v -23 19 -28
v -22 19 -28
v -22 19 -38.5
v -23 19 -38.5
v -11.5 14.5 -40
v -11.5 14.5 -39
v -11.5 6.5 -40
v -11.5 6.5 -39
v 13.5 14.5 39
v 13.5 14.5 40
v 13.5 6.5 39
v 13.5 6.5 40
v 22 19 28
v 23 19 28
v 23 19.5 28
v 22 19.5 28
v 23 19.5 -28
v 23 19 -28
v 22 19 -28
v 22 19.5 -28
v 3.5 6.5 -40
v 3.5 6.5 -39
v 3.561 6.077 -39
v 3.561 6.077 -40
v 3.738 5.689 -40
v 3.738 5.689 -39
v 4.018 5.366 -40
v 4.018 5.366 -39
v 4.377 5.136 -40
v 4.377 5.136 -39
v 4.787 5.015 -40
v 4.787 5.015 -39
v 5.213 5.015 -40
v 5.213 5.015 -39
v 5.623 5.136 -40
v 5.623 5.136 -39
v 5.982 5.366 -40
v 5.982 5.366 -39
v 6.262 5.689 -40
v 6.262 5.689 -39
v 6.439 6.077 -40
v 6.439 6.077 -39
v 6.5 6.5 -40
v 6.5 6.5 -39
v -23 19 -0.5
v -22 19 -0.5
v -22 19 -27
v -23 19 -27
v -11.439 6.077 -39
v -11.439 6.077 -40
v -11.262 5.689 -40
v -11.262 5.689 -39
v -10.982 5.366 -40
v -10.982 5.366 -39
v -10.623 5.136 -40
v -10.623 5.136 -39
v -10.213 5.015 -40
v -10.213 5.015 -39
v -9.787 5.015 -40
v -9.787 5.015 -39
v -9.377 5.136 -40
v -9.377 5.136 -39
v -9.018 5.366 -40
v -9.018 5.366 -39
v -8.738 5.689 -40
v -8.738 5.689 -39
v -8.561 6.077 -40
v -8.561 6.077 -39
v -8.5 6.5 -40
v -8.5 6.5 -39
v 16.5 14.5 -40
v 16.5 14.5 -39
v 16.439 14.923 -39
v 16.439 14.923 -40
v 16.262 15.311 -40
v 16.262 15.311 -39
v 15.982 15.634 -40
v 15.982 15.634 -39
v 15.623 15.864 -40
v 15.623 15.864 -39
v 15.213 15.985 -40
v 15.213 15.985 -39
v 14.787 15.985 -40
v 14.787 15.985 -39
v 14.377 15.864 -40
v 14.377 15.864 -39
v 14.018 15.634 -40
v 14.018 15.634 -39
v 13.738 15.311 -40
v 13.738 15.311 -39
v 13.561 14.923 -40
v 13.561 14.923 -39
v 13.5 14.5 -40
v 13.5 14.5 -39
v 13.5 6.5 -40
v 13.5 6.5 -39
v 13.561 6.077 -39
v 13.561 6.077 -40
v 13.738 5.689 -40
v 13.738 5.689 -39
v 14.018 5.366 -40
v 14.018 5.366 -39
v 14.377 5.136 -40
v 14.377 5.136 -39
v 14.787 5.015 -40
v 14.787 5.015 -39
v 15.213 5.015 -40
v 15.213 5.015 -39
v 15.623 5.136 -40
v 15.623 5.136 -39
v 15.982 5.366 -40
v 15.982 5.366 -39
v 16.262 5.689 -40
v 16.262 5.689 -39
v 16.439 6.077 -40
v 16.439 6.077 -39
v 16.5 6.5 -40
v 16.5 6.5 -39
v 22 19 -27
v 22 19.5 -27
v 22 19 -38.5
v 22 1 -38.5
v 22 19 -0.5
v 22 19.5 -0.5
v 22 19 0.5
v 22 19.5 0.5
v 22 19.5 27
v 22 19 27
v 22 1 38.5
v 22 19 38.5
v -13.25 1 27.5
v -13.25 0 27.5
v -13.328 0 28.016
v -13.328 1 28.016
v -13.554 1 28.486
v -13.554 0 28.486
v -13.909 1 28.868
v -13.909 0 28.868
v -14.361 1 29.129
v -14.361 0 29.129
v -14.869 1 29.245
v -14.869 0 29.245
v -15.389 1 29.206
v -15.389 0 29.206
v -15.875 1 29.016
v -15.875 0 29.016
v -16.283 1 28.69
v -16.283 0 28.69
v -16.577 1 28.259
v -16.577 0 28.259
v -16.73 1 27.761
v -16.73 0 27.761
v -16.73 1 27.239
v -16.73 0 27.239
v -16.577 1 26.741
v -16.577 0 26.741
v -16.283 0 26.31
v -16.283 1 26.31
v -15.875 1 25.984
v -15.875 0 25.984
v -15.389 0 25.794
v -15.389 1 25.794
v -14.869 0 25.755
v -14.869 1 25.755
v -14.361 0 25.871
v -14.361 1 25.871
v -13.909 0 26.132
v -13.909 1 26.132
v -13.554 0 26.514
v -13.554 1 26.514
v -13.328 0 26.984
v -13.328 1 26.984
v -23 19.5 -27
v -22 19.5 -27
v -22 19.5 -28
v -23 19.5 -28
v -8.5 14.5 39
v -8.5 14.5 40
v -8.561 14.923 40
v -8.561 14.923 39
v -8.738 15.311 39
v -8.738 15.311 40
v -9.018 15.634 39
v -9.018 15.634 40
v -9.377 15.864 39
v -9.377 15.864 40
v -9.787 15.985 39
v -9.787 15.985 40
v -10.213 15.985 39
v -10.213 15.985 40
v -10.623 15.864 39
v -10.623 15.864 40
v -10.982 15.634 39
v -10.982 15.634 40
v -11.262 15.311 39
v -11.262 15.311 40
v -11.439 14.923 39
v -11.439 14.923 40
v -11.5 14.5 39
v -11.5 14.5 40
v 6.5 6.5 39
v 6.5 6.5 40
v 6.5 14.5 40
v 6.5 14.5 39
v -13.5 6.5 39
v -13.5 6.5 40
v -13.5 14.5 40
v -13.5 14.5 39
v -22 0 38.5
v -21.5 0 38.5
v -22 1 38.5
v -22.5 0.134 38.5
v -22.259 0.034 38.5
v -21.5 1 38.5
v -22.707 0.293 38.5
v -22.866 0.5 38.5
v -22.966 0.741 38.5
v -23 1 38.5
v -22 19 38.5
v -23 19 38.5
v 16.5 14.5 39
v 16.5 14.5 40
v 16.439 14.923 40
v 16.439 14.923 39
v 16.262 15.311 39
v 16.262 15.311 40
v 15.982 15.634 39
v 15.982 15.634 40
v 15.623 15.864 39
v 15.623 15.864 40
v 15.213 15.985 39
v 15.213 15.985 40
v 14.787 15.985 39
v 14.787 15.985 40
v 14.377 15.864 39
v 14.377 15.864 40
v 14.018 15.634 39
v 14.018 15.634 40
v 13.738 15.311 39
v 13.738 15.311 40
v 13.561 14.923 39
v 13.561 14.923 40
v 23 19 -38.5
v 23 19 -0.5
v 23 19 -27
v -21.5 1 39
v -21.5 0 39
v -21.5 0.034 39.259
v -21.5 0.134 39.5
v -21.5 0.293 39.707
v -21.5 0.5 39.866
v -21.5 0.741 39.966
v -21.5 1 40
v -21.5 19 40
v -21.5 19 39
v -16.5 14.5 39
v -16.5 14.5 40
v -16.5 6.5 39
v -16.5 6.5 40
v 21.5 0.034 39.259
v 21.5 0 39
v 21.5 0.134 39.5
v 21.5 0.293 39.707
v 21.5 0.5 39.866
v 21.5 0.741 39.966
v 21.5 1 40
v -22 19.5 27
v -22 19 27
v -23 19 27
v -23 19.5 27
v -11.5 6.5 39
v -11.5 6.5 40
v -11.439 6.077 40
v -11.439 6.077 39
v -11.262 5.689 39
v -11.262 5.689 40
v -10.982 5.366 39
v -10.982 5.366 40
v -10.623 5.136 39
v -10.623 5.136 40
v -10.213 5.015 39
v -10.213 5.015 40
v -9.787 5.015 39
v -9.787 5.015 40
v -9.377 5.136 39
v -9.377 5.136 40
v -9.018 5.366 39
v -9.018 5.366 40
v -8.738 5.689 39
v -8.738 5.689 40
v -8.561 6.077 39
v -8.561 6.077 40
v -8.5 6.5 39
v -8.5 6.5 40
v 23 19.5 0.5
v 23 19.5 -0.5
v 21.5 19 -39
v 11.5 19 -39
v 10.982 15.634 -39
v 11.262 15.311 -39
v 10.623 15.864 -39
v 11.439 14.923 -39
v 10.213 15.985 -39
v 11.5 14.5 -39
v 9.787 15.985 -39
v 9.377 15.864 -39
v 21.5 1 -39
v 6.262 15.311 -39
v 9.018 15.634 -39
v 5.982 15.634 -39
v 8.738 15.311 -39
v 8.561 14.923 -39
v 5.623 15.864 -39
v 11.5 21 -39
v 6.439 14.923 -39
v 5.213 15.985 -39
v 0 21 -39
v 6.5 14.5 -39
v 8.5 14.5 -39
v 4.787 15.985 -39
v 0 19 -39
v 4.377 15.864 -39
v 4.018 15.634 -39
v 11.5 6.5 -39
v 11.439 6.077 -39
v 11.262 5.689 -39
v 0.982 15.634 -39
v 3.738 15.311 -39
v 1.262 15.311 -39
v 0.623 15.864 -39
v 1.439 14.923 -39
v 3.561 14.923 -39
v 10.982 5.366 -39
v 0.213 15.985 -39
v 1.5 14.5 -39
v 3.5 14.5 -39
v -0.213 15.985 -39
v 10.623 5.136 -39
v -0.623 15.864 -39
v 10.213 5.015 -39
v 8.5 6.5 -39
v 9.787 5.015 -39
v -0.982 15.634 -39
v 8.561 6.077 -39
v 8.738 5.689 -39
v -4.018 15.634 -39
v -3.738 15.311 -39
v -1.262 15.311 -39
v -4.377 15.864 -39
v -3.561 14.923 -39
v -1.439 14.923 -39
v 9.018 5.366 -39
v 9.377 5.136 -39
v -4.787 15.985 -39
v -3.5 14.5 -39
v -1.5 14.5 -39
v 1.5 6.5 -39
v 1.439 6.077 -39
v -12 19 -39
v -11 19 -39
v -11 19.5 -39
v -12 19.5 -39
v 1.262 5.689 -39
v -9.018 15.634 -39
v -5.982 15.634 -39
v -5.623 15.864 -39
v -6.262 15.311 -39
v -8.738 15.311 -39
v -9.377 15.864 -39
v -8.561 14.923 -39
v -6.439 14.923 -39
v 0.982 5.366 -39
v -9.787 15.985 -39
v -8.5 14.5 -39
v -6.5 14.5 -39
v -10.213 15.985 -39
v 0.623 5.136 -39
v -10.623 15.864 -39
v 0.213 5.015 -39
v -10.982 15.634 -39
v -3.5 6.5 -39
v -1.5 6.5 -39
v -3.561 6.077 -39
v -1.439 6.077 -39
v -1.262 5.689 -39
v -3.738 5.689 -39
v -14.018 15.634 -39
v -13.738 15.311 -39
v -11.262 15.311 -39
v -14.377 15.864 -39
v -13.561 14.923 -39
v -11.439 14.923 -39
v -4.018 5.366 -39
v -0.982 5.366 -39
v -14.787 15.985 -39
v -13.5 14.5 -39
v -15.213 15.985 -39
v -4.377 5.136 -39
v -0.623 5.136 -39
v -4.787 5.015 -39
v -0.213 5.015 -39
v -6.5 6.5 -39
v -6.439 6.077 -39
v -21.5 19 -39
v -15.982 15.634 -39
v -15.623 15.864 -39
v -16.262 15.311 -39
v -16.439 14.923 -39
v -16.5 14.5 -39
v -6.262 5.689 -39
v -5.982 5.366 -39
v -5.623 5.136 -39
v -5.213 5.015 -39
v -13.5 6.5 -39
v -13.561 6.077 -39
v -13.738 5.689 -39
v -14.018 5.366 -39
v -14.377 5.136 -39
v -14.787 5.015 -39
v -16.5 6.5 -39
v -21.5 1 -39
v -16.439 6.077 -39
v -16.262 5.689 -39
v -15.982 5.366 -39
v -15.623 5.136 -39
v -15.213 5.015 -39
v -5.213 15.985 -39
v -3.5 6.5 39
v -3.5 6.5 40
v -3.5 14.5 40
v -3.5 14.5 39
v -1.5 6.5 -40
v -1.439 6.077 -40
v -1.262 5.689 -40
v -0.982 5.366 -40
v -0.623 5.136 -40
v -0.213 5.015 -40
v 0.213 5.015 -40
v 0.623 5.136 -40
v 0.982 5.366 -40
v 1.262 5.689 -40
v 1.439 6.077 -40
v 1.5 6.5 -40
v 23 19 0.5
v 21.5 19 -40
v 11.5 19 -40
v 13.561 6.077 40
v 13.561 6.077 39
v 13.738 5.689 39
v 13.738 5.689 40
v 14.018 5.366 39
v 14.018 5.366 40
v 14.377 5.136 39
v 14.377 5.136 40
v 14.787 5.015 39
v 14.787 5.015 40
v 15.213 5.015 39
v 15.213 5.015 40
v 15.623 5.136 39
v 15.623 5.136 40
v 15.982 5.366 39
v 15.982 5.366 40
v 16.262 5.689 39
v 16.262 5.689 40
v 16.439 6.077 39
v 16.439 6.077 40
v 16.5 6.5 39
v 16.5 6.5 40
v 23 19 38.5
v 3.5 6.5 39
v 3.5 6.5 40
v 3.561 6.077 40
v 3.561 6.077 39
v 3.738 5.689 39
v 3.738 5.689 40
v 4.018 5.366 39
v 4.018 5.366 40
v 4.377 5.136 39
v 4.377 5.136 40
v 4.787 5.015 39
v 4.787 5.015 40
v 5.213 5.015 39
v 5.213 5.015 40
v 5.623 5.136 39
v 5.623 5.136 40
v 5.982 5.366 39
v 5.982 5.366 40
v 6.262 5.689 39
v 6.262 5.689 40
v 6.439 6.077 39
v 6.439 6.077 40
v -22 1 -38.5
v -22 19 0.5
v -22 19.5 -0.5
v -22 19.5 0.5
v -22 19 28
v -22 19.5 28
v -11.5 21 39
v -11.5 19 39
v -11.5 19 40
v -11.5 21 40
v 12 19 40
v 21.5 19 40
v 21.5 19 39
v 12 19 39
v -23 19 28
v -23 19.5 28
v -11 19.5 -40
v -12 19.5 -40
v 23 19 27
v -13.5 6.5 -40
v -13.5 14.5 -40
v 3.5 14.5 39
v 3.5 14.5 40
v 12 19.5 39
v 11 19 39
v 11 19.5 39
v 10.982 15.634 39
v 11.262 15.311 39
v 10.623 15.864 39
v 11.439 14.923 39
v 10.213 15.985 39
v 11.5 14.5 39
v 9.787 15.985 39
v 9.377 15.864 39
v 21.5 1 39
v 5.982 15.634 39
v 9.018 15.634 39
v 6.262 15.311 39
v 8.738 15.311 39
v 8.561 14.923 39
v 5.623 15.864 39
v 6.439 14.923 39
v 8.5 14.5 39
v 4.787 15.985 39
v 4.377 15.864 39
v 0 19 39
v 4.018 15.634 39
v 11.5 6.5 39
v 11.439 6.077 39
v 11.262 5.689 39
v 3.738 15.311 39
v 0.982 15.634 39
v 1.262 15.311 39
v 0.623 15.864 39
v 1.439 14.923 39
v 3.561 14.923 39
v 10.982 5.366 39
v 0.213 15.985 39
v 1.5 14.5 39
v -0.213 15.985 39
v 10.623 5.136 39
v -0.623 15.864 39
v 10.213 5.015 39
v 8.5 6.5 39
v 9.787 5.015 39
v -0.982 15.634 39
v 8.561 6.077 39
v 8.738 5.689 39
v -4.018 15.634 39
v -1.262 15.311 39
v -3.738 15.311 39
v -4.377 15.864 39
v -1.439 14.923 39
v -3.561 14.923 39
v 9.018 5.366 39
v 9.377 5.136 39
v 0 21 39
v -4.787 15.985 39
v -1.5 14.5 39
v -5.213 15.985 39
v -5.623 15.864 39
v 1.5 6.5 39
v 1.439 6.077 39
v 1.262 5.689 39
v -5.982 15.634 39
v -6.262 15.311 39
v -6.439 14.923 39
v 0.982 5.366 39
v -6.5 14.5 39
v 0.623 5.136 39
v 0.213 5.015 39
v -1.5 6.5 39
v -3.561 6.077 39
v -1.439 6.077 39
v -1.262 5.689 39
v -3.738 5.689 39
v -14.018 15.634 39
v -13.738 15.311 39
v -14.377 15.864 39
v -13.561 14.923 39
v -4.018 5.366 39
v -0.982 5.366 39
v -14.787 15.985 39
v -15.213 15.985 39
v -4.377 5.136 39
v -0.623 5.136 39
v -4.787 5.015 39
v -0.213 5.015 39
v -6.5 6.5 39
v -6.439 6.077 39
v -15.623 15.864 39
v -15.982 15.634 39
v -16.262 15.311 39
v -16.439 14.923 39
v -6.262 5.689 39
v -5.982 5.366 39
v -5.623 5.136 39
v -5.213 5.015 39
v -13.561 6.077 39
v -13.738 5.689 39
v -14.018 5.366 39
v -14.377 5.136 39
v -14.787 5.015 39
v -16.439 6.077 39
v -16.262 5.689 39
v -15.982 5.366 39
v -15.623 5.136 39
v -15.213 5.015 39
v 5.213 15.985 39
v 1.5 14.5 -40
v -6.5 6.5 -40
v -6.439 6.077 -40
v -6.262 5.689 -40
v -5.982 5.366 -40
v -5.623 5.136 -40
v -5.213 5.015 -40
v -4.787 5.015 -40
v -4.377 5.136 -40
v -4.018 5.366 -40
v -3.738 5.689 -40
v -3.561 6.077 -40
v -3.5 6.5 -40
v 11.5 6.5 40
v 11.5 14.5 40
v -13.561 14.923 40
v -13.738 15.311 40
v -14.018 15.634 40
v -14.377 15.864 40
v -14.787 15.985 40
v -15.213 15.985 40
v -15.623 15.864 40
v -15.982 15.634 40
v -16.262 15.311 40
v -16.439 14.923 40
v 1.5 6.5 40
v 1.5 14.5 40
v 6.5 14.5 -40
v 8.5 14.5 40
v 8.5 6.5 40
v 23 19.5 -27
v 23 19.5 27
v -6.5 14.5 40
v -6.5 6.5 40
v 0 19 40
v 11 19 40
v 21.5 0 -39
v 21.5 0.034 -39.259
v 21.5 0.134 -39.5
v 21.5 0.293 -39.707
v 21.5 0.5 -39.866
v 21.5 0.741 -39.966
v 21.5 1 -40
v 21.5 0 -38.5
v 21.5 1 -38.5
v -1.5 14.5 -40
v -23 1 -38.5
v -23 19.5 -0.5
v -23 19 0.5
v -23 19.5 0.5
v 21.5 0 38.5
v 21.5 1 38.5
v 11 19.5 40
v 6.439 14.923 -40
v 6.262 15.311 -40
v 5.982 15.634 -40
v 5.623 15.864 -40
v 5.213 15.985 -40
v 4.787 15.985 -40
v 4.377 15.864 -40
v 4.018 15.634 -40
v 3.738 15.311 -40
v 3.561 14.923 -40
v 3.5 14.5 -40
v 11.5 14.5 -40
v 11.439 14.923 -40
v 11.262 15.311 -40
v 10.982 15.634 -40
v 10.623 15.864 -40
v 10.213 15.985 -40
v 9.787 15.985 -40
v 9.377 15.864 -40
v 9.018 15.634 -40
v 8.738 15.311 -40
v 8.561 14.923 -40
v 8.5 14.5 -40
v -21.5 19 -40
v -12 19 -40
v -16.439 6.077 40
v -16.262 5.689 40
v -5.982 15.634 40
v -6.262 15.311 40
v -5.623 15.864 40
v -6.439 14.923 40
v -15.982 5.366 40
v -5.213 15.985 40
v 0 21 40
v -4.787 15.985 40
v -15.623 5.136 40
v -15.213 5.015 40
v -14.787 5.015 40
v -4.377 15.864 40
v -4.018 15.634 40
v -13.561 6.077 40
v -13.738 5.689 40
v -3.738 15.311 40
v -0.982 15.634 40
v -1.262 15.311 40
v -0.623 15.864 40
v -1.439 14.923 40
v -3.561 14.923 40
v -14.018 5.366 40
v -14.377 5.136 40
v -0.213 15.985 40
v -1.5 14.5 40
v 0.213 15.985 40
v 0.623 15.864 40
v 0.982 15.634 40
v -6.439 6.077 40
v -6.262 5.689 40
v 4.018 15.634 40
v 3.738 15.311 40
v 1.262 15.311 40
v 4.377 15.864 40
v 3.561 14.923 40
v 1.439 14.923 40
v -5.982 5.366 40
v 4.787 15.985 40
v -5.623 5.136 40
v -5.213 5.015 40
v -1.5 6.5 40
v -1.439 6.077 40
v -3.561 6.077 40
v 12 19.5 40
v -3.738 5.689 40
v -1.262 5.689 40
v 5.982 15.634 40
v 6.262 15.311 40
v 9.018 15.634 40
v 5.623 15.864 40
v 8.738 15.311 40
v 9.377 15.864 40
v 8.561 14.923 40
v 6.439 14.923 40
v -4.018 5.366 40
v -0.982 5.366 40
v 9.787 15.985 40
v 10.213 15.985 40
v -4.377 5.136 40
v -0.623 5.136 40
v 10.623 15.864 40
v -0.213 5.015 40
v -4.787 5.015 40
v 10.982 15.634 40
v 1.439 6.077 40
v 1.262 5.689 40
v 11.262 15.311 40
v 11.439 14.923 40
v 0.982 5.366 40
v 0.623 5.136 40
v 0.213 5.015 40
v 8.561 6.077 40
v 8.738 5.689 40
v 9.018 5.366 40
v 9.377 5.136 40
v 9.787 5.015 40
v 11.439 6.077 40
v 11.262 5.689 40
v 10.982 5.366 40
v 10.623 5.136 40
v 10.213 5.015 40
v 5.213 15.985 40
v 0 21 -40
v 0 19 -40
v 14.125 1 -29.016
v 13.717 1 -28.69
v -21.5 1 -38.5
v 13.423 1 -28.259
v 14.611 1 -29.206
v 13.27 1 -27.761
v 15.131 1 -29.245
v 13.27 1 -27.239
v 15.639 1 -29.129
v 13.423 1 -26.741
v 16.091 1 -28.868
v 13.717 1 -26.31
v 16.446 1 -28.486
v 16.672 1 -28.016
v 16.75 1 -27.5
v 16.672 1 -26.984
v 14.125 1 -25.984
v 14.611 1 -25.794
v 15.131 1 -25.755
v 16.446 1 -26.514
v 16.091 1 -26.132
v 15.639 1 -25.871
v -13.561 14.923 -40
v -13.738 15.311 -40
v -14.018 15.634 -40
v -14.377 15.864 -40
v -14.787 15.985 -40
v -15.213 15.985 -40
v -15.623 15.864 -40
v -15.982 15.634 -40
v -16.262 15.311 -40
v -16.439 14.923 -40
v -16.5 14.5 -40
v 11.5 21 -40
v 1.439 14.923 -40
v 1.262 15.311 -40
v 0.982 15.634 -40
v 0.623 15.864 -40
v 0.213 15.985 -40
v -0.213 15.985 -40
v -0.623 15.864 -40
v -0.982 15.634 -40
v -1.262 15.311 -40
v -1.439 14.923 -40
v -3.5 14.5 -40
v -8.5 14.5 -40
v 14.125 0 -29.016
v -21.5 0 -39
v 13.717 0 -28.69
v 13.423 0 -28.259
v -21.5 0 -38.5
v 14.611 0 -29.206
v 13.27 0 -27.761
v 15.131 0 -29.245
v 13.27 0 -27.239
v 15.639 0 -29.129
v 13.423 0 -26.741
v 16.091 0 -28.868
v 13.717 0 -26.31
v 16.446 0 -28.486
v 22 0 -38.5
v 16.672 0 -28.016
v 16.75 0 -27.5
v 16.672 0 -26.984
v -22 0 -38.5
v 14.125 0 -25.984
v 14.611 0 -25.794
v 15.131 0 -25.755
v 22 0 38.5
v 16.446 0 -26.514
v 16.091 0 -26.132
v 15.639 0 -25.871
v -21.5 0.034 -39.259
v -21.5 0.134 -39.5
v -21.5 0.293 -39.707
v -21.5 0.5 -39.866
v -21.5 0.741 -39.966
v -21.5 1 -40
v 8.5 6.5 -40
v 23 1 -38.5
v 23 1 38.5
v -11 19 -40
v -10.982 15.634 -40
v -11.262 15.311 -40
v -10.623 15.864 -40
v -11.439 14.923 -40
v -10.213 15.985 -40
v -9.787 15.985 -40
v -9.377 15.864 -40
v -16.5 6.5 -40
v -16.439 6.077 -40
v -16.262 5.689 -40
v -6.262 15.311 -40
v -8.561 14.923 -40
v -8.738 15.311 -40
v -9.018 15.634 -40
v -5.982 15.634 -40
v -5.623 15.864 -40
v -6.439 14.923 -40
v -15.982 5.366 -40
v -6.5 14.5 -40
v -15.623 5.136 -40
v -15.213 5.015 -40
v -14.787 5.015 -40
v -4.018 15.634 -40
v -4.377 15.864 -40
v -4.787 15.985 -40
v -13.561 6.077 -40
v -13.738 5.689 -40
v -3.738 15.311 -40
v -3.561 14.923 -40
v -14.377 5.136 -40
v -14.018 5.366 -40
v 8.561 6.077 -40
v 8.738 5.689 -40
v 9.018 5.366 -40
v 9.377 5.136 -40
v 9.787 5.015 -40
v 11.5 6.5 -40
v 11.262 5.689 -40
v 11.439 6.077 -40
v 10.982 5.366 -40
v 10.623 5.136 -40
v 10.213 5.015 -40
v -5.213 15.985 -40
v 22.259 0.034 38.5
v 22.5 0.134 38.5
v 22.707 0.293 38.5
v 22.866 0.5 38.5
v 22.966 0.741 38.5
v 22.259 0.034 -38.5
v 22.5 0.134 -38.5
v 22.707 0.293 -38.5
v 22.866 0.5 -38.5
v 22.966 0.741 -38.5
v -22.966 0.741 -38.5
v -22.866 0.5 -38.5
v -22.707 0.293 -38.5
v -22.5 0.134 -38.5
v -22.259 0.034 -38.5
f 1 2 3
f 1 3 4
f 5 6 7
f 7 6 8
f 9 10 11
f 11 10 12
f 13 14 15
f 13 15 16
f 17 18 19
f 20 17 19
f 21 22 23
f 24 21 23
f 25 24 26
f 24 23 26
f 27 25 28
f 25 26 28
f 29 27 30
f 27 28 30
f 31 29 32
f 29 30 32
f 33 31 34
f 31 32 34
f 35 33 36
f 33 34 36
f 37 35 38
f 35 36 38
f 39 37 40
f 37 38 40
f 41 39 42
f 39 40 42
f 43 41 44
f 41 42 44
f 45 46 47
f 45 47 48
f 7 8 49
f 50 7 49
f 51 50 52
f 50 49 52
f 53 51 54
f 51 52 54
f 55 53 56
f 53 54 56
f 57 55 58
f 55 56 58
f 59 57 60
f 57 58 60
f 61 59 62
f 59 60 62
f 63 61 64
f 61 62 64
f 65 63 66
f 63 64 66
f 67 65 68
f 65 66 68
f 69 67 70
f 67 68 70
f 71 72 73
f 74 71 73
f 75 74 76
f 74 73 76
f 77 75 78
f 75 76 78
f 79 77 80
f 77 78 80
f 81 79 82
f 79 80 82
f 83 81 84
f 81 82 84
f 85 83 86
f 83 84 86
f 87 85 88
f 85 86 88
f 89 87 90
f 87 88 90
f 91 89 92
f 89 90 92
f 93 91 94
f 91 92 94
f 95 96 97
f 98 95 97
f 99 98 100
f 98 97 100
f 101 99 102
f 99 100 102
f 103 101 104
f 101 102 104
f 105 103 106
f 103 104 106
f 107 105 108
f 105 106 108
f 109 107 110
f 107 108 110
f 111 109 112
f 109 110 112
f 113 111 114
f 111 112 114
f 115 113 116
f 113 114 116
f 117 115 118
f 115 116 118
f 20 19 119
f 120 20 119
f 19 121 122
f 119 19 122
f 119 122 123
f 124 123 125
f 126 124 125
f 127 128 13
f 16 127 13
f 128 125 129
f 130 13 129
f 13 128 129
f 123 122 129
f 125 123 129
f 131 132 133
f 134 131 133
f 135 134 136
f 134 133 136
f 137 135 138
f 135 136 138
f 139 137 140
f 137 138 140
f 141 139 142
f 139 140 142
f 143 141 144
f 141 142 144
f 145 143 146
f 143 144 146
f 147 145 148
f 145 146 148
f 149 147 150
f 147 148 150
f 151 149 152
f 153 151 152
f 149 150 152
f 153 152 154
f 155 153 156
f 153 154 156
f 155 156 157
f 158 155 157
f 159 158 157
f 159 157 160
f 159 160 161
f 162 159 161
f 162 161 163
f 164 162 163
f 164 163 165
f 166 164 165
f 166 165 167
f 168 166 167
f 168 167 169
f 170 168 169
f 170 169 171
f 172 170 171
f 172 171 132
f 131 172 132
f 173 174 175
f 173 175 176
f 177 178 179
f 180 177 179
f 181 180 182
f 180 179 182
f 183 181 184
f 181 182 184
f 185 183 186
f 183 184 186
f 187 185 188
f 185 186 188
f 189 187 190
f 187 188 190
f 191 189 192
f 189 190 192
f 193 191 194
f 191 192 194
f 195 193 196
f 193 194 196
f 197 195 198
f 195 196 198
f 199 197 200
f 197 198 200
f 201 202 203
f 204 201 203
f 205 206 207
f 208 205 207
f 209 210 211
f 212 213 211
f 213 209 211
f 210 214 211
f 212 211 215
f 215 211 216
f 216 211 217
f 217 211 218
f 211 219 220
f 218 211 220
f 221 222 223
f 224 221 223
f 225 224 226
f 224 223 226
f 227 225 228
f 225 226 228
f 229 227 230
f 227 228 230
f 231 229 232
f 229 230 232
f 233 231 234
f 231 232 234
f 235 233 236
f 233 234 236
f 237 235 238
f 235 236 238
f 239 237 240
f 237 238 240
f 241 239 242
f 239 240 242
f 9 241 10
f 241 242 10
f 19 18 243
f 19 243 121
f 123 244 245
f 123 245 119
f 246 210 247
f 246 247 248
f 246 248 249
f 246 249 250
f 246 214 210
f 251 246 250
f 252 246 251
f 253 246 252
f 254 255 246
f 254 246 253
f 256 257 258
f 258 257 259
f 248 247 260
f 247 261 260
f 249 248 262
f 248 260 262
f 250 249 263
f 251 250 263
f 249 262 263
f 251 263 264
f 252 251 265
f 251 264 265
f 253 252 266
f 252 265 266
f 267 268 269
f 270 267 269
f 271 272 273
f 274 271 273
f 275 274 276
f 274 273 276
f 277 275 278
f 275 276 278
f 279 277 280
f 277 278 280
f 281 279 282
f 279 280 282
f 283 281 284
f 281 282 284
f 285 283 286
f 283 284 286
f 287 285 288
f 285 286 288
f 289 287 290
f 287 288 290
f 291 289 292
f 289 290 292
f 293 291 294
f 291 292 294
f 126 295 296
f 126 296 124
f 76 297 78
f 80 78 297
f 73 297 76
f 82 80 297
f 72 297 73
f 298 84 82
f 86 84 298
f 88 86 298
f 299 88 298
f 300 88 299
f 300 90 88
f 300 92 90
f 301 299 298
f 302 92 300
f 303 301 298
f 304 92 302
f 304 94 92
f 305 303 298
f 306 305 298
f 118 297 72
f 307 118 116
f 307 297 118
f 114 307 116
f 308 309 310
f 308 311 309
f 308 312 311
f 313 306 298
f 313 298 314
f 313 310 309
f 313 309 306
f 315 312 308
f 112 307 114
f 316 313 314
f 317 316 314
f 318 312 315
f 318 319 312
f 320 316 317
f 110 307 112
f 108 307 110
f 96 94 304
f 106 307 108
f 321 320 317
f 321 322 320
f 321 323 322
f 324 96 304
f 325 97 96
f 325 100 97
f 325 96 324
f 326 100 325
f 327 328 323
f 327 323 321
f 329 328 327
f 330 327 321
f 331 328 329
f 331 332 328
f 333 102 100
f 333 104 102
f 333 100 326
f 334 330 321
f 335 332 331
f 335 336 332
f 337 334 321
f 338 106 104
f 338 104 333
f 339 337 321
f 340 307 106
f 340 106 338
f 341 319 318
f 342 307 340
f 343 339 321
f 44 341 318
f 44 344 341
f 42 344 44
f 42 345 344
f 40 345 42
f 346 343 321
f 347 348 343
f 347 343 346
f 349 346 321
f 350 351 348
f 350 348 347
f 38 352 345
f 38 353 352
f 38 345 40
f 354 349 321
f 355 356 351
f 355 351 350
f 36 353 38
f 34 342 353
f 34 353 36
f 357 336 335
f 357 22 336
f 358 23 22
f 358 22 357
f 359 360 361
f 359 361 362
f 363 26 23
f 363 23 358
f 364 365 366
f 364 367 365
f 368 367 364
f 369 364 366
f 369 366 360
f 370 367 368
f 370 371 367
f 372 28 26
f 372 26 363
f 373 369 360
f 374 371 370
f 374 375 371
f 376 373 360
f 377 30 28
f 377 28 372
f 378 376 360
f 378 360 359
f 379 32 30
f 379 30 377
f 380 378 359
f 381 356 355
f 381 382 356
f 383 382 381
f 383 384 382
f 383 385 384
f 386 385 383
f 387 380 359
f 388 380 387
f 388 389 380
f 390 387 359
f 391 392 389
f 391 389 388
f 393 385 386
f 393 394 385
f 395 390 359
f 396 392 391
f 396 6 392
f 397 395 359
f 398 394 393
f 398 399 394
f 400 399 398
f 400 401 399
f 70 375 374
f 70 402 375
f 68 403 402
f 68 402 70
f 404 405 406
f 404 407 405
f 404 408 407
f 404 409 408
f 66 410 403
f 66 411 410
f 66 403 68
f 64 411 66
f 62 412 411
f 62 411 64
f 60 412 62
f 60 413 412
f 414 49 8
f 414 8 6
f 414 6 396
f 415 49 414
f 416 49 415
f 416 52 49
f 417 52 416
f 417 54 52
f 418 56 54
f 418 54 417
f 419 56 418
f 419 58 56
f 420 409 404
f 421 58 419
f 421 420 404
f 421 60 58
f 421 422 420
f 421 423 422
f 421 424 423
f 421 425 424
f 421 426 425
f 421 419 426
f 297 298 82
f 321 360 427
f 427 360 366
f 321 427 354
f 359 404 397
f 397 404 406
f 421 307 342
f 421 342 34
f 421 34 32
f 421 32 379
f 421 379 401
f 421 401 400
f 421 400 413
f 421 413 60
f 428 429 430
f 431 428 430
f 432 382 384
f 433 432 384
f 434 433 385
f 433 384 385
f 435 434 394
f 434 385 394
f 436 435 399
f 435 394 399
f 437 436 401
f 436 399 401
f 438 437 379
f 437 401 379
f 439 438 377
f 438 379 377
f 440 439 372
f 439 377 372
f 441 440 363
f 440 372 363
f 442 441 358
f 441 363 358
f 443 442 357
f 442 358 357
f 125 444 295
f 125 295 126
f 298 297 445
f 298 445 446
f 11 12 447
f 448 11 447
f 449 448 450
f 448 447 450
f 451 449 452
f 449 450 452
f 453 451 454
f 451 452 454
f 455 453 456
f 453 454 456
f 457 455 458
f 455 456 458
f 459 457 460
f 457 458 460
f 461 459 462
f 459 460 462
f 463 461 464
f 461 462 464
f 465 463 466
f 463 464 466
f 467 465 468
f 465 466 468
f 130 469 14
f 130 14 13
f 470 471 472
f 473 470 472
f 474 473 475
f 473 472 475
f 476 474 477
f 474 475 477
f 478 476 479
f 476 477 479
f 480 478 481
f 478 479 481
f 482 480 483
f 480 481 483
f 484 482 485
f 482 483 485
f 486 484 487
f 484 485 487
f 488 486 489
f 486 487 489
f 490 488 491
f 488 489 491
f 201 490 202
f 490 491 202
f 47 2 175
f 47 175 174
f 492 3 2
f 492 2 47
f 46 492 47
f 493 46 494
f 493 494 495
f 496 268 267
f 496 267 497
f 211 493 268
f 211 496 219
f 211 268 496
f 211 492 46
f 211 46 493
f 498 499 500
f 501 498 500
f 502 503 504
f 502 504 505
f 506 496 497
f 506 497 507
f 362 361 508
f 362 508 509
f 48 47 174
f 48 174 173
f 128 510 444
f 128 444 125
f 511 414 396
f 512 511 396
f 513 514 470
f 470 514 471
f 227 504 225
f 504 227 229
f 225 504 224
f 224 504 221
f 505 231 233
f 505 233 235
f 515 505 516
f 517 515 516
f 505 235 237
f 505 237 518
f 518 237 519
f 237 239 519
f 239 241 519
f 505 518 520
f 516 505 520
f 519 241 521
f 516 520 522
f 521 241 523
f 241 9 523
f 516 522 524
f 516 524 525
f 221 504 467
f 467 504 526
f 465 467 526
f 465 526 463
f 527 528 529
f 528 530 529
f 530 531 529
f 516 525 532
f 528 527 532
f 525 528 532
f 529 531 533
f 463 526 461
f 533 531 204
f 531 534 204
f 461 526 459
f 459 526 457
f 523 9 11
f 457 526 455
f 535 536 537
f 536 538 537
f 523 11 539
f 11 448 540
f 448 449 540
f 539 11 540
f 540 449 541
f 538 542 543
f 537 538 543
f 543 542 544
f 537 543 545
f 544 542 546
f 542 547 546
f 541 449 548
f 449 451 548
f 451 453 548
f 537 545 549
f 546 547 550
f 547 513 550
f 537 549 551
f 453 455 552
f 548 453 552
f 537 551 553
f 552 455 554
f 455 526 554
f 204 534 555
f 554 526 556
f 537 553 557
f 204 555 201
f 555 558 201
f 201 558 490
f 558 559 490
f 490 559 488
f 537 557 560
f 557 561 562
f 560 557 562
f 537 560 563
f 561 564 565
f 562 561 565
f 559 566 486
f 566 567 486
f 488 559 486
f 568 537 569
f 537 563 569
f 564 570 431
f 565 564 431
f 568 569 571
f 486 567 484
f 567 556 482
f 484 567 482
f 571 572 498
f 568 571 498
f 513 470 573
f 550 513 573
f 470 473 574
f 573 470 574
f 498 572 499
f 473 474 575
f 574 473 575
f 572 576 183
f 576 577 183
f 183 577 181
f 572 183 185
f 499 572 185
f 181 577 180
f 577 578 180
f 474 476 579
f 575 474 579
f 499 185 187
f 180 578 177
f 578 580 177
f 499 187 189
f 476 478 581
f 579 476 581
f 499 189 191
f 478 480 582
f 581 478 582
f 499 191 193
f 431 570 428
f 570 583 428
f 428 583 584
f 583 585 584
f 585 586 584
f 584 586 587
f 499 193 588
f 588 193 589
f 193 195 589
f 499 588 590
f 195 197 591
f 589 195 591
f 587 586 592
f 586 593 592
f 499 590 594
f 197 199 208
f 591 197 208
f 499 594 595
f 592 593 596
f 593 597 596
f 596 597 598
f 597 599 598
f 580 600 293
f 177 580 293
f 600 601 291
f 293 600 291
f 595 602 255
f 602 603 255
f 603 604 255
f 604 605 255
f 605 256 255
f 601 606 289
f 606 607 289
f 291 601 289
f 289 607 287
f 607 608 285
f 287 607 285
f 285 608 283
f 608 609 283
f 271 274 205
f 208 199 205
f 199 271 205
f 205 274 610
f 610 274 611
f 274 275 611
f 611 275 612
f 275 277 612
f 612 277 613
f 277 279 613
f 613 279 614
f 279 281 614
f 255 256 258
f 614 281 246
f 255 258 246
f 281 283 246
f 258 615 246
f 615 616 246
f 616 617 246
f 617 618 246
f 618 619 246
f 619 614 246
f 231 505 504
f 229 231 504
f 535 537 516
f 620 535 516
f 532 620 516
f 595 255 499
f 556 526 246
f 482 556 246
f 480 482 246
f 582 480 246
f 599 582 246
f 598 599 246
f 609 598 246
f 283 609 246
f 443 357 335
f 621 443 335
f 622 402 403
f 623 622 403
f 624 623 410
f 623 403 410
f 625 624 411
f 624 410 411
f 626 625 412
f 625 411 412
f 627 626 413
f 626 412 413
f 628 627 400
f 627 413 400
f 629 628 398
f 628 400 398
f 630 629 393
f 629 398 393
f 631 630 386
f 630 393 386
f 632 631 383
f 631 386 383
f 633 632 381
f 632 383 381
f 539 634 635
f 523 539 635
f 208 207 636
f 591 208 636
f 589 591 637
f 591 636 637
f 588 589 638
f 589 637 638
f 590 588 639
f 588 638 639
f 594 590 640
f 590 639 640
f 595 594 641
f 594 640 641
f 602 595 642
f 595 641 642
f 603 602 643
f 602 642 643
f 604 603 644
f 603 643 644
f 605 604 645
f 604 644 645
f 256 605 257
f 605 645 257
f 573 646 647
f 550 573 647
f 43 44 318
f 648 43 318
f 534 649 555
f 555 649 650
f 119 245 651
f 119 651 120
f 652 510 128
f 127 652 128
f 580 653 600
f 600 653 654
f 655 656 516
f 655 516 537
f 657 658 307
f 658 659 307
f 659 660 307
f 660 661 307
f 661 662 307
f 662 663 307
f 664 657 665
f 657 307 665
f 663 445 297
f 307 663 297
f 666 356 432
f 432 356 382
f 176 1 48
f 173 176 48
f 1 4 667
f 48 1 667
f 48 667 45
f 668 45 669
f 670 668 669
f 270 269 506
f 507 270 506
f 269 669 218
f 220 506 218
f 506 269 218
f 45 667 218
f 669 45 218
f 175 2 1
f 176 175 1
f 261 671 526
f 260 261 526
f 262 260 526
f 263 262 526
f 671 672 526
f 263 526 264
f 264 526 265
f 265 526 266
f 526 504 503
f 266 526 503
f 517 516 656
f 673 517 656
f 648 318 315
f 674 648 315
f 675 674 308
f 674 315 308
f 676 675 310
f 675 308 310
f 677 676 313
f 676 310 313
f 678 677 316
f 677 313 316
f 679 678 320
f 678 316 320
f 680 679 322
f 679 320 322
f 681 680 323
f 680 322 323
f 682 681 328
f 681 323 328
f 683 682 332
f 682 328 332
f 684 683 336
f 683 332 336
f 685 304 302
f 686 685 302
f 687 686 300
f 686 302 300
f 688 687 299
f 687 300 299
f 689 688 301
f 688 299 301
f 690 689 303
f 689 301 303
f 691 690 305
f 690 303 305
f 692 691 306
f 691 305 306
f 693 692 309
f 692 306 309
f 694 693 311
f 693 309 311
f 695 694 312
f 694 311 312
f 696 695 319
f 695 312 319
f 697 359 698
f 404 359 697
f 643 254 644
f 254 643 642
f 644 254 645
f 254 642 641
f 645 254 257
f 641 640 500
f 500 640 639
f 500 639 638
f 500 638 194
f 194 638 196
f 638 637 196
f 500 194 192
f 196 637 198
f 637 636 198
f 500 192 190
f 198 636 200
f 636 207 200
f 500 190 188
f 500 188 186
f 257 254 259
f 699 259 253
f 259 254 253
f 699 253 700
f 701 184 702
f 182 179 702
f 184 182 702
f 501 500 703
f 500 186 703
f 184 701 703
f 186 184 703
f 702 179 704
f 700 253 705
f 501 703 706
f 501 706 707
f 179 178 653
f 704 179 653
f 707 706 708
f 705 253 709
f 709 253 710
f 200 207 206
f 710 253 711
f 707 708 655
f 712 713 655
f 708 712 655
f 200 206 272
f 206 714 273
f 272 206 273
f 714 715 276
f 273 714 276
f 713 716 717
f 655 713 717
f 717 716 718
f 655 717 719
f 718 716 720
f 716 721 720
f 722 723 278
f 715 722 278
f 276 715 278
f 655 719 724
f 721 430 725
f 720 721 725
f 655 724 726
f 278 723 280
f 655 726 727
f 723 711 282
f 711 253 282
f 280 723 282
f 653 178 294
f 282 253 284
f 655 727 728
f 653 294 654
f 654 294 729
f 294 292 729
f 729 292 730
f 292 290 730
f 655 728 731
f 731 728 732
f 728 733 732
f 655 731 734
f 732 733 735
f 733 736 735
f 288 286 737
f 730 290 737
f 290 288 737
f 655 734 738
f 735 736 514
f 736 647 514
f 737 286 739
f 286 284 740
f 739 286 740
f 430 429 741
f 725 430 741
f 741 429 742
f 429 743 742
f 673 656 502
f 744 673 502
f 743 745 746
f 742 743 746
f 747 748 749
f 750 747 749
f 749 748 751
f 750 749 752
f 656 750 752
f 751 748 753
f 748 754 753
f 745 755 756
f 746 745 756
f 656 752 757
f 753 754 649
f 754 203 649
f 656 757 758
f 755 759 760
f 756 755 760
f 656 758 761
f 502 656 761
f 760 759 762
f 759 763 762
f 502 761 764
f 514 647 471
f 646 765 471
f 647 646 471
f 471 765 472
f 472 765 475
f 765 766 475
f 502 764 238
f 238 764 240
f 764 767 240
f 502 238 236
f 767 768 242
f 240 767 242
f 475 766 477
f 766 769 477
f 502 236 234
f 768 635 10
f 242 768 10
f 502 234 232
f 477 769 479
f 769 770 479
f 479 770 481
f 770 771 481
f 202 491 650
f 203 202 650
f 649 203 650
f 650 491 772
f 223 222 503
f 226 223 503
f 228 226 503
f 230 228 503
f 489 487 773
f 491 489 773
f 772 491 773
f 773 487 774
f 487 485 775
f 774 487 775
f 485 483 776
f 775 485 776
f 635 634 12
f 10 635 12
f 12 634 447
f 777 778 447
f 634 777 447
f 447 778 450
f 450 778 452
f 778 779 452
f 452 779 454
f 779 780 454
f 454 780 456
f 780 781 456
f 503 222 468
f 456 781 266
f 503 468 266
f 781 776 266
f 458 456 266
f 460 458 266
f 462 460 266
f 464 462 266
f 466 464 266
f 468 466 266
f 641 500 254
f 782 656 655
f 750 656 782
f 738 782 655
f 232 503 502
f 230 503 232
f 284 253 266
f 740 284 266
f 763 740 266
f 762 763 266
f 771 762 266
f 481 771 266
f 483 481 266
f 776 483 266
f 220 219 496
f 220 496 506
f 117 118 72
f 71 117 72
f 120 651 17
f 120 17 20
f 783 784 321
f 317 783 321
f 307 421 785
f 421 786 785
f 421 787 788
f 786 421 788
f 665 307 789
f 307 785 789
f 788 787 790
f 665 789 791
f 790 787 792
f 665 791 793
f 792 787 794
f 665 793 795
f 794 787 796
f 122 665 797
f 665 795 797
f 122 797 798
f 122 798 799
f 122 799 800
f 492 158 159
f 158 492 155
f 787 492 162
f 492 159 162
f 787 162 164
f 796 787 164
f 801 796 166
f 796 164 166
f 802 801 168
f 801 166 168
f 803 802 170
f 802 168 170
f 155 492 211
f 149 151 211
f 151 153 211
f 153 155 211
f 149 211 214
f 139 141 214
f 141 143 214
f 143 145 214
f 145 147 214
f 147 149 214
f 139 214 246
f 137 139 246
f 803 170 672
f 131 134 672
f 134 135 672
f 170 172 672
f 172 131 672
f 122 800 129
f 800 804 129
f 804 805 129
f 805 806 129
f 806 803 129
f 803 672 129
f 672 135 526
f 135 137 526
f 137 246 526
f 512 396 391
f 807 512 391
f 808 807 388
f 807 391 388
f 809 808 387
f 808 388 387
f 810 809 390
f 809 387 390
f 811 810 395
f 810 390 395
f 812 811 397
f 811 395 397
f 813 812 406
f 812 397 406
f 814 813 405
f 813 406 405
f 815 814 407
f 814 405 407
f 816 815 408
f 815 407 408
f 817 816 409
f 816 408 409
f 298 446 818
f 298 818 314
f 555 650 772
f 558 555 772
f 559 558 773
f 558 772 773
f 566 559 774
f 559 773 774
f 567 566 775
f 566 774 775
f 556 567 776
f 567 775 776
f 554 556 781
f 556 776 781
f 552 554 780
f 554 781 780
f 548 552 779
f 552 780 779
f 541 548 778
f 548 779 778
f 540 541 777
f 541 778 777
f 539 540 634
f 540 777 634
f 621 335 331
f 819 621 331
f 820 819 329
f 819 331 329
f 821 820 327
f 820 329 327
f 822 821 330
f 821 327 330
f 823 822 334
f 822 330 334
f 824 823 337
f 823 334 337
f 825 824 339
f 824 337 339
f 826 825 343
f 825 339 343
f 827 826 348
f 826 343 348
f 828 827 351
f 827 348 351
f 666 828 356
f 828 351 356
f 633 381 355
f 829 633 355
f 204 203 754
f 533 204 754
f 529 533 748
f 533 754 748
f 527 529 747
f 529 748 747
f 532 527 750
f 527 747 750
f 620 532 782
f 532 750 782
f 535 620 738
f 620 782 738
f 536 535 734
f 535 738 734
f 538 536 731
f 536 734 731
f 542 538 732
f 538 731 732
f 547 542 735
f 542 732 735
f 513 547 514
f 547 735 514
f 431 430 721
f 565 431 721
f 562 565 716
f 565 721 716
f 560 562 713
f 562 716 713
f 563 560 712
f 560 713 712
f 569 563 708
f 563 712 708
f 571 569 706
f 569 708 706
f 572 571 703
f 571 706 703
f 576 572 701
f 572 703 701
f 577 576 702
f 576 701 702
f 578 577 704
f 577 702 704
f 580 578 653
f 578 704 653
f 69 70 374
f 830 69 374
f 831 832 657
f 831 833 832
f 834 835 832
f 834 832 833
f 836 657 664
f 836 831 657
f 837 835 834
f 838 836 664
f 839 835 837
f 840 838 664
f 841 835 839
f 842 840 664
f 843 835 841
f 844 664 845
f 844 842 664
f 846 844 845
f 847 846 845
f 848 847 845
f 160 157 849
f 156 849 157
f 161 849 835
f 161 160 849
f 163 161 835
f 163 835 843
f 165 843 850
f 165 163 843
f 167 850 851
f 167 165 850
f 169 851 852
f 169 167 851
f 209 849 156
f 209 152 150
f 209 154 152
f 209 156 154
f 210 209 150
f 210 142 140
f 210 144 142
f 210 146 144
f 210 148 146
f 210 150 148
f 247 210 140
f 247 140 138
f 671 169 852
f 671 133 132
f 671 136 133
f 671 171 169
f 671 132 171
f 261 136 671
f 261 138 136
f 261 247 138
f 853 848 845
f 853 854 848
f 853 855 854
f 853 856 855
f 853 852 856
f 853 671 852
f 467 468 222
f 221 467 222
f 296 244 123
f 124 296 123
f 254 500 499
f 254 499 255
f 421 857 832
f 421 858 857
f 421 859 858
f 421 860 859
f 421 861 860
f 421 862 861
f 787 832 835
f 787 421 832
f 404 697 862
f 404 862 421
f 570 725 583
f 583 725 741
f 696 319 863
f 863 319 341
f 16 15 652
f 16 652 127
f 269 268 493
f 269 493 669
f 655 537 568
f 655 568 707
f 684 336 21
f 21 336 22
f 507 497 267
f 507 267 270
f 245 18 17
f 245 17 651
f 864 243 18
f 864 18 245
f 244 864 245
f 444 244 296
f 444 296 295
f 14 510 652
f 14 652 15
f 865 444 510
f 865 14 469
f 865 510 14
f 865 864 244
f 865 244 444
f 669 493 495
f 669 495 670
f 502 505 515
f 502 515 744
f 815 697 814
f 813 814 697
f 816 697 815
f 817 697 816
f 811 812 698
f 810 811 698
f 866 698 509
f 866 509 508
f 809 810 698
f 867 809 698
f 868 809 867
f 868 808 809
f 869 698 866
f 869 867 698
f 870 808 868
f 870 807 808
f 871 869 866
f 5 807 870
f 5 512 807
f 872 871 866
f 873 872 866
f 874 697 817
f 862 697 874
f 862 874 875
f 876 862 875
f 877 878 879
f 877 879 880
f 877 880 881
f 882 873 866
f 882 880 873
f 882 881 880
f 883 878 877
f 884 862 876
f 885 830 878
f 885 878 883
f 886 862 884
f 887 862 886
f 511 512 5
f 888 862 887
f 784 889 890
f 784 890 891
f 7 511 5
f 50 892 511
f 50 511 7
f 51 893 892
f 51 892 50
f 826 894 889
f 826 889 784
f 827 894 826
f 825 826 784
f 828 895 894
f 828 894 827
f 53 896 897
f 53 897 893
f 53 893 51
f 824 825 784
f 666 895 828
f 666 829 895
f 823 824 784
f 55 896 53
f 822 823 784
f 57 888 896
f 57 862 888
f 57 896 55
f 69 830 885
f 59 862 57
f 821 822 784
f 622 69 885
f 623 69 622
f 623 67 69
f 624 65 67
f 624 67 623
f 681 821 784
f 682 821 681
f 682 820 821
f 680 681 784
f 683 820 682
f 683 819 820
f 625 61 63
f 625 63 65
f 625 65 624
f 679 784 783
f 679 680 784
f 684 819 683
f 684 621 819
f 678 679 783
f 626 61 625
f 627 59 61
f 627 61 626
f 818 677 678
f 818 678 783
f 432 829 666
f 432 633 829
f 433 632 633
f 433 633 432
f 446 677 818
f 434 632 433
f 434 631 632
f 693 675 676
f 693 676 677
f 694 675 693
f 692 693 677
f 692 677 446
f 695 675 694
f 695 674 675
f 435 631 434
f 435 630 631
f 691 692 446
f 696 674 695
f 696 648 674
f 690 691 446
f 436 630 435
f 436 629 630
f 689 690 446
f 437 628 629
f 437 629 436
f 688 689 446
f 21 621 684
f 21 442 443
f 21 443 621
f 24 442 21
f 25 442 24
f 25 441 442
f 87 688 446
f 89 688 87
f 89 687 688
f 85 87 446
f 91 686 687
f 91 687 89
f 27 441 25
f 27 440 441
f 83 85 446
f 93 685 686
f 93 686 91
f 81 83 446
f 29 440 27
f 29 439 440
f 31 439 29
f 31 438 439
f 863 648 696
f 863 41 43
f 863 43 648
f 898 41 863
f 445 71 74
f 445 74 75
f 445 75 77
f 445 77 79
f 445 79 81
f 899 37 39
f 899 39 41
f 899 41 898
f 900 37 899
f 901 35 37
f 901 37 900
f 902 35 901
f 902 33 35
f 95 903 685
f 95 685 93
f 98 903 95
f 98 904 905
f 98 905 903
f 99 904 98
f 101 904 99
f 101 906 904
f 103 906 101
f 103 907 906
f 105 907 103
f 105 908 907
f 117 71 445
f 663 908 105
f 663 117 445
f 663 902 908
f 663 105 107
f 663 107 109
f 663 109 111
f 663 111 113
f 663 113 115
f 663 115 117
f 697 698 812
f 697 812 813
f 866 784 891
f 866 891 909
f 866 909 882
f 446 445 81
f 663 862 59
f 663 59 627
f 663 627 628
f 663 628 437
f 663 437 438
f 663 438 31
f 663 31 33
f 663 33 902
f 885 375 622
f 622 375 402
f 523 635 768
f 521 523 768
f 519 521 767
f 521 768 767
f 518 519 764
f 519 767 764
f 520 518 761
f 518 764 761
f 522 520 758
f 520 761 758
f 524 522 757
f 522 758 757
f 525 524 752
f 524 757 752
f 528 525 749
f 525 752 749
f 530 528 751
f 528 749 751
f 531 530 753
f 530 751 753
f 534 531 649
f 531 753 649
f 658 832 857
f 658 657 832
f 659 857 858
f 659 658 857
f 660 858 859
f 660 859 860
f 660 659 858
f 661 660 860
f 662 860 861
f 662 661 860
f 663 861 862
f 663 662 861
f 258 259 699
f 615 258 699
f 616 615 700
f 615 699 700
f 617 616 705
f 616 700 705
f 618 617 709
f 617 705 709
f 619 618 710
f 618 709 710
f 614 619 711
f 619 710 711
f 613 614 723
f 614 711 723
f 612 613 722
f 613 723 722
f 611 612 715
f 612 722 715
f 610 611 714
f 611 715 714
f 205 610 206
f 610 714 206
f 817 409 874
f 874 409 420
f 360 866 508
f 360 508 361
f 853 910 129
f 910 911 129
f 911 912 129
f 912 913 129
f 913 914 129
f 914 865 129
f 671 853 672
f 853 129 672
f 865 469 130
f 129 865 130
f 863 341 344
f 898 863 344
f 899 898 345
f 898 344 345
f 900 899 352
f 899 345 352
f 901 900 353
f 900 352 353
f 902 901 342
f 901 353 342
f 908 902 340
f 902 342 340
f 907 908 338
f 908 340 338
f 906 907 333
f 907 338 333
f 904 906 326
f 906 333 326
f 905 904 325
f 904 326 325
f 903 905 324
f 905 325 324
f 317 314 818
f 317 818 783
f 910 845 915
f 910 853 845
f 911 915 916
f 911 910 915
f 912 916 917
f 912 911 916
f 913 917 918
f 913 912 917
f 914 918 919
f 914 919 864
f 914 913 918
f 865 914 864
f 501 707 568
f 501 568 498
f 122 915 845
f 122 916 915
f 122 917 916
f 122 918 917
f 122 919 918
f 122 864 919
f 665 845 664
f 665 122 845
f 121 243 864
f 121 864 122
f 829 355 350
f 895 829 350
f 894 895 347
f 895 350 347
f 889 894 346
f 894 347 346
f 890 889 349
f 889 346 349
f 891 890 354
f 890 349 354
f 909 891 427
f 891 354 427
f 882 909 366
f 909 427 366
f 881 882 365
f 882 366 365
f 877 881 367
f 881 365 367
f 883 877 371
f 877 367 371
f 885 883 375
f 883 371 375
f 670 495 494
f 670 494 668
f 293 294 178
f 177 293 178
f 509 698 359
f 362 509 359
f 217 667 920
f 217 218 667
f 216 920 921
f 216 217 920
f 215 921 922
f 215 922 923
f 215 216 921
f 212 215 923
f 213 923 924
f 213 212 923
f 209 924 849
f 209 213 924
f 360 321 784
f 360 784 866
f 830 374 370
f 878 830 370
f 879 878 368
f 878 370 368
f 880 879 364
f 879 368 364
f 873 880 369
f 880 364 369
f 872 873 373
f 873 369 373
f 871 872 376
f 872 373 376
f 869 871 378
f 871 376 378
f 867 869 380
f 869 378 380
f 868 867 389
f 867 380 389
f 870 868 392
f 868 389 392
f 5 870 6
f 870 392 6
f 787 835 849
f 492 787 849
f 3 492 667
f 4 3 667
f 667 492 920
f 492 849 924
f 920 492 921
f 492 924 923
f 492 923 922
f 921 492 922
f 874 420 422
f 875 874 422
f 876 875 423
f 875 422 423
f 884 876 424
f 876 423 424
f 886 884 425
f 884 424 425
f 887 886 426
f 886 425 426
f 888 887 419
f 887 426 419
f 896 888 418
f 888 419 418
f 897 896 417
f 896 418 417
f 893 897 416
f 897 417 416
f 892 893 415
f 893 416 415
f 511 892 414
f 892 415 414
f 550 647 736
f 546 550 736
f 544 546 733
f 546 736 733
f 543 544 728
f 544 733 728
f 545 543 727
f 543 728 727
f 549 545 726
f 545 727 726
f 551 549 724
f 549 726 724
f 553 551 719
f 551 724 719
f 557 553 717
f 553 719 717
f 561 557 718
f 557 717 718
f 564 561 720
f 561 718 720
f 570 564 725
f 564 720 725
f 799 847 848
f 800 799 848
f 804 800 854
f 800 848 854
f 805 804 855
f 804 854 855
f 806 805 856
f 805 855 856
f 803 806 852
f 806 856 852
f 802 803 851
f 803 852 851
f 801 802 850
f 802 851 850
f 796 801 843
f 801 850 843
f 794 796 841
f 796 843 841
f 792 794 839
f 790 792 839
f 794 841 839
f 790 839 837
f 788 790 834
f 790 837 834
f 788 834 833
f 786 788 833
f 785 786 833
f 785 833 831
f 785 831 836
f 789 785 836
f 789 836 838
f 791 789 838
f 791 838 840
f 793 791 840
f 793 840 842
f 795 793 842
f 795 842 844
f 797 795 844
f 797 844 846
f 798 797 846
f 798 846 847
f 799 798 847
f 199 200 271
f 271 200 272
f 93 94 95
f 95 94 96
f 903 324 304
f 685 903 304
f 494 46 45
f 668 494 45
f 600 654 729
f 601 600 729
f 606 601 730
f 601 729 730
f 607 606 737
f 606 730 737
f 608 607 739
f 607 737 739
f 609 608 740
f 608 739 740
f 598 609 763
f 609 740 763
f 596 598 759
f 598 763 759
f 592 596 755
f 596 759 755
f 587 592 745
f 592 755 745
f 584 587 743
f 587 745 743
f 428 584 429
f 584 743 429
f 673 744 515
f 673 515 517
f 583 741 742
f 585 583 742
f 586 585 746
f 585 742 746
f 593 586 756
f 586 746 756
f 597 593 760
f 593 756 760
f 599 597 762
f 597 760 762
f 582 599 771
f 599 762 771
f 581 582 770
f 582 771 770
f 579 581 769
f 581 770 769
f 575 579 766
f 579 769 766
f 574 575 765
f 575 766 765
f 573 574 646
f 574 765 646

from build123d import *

# Parameters (mm, degrees)
F0_W      = 46
F0_H      = 80
F1_DEPTH  = 1
F2_W      = 43
F2_H      = 1
F2_W_2    = 1
F2_H_2    = 77
F3_DEPTH  = 18
F4_W      = 1.5
F4_H      = 1.5
F5_DEPTH  = 1.001
F6_R      = 1.75
F7_DEPTH  = 19.001
F9_DEPTH  = 80.001
F10_W     = 11.5
F10_H     = 1
F11_DEPTH = 2
F12_W     = 1
F12_H     = 1
F13_DEPTH = 0.5
F14_R     = 1


with BuildPart() as f1:
    # F0 (on Front) → F1 (new body)
    with BuildSketch(Plane.XZ):
        Rectangle(F0_W, F0_H)
    extrude(amount=-F1_DEPTH)

    # F2 (on face) → F3 (join)
    with BuildSketch(Plane(origin=(0, 1, 0), x_dir=(-1, 0, 0), z_dir=(0, 1, 0))):
        with Locations((0, 39.5)):
            Rectangle(F2_W, F2_H)
        with Locations((-22.5, 0)):
            Rectangle(F2_W_2, F2_H_2)
        with Locations((22.5, 0)):
            Rectangle(F2_W_2, F2_H_2)
        with Locations((0, -39.5)):
            Rectangle(F2_W, F2_H)
    extrude(amount=F3_DEPTH)

    # F4 (on face) → F5 (cut, through all)
    with BuildSketch(Plane(origin=(0, 1, 0), x_dir=(-1, 0, 0), z_dir=(0, 1, 0))):
        with Locations((22.25, 39.25)):
            Rectangle(F4_W, F4_H)
        with Locations((-22.25, 39.25)):
            Rectangle(F4_W, F4_H)
        with Locations((22.25, -39.25)):
            Rectangle(F4_W, F4_H)
        with Locations((-22.25, -39.25)):
            Rectangle(F4_W, F4_H)
    extrude(amount=-F5_DEPTH, mode=Mode.SUBTRACT)

    # F6 (on face) → F7 (cut, through all)
    with BuildSketch(Plane.XZ):
        with Locations((15, -27.5)):
            Circle(F6_R)
        with Locations((-15, 27.5)):
            Circle(F6_R)
    extrude(amount=-F7_DEPTH, mode=Mode.SUBTRACT)

    # F8 (on face) → F9 (cut, through all)
    with BuildSketch(Plane.XY.offset(40)):
        with BuildLine():
            ThreePointArc((-1.5, 6.5), (0, 5), (1.5, 6.5))
            Line((1.5, 6.5), (1.5, 14.5))
            ThreePointArc((1.5, 14.5), (0, 16), (-1.5, 14.5))
            Line((-1.5, 14.5), (-1.5, 6.5))
        make_face()
        with BuildLine():
            ThreePointArc((-6.5, 6.5), (-5, 5), (-3.5, 6.5))
            Line((-3.5, 6.5), (-3.5, 14.5))
            ThreePointArc((-3.5, 14.5), (-5, 16), (-6.5, 14.5))
            Line((-6.5, 14.5), (-6.5, 6.5))
        make_face()
        with BuildLine():
            ThreePointArc((-11.5, 6.5), (-10, 5), (-8.5, 6.5))
            Line((-8.5, 6.5), (-8.5, 14.5))
            ThreePointArc((-8.5, 14.5), (-10, 16), (-11.5, 14.5))
            Line((-11.5, 14.5), (-11.5, 6.5))
        make_face()
        with BuildLine():
            ThreePointArc((-16.5, 6.5), (-15, 5), (-13.5, 6.5))
            Line((-13.5, 6.5), (-13.5, 14.5))
            ThreePointArc((-13.5, 14.5), (-15, 16), (-16.5, 14.5))
            Line((-16.5, 14.5), (-16.5, 6.5))
        make_face()
        with BuildLine():
            ThreePointArc((8.5, 6.5), (10, 5), (11.5, 6.5))
            Line((11.5, 6.5), (11.5, 14.5))
            ThreePointArc((11.5, 14.5), (10, 16), (8.5, 14.5))
            Line((8.5, 14.5), (8.5, 6.5))
        make_face()
        with BuildLine():
            ThreePointArc((3.5, 6.5), (5, 5), (6.5, 6.5))
            Line((6.5, 6.5), (6.5, 14.5))
            ThreePointArc((6.5, 14.5), (5, 16), (3.5, 14.5))
            Line((3.5, 14.5), (3.5, 6.5))
        make_face()
        with BuildLine():
            ThreePointArc((13.5, 6.5), (15, 5), (16.5, 6.5))
            Line((16.5, 6.5), (16.5, 14.5))
            ThreePointArc((16.5, 14.5), (15, 16), (13.5, 14.5))
            Line((13.5, 14.5), (13.5, 6.5))
        make_face()
    extrude(amount=-F9_DEPTH, mode=Mode.SUBTRACT)

    # F10 (on face) → F11 (join)
    with BuildSketch(Plane(origin=(0, 19, 0), x_dir=(-1, 0, 0), z_dir=(0, 1, 0))):
        with Locations((-5.75, -39.5)):
            Rectangle(F10_W, F10_H)
        with Locations((5.75, 39.5)):
            Rectangle(F10_W, F10_H)
    extrude(amount=F11_DEPTH)

    # F12 (on face) → F13 (join)
    with BuildSketch(Plane(origin=(0, 19, 0), x_dir=(-1, 0, 0), z_dir=(0, 1, 0))):
        with Locations((11.5, -39.5)):
            Rectangle(F12_W, F12_H)
        with Locations((-11.5, 39.5)):
            Rectangle(F12_W, F12_H)
        with Locations((22.5, 27.5)):
            Rectangle(F12_W, F12_H)
        with Locations((-22.5, 27.5)):
            Rectangle(F12_W, F12_H)
        with Locations((22.5, -27.5)):
            Rectangle(F12_W, F12_H)
        with Locations((-22.5, -27.5)):
            Rectangle(F12_W, F12_H)
        with Locations((22.5, 0)):
            Rectangle(F12_W, F12_H)
        with Locations((-22.5, 0)):
            Rectangle(F12_W, F12_H)
    extrude(amount=F13_DEPTH)

    # F14
    f14_edges = [f1.edges().sort_by_distance(p)[0] for p in [
        (-23, 0, 0),
        (0, 0, 40),
        (23, 0, 0),
        (0, 0, -40),
    ]]
    fillet(f14_edges, radius=F14_R)


solid = f1.part
